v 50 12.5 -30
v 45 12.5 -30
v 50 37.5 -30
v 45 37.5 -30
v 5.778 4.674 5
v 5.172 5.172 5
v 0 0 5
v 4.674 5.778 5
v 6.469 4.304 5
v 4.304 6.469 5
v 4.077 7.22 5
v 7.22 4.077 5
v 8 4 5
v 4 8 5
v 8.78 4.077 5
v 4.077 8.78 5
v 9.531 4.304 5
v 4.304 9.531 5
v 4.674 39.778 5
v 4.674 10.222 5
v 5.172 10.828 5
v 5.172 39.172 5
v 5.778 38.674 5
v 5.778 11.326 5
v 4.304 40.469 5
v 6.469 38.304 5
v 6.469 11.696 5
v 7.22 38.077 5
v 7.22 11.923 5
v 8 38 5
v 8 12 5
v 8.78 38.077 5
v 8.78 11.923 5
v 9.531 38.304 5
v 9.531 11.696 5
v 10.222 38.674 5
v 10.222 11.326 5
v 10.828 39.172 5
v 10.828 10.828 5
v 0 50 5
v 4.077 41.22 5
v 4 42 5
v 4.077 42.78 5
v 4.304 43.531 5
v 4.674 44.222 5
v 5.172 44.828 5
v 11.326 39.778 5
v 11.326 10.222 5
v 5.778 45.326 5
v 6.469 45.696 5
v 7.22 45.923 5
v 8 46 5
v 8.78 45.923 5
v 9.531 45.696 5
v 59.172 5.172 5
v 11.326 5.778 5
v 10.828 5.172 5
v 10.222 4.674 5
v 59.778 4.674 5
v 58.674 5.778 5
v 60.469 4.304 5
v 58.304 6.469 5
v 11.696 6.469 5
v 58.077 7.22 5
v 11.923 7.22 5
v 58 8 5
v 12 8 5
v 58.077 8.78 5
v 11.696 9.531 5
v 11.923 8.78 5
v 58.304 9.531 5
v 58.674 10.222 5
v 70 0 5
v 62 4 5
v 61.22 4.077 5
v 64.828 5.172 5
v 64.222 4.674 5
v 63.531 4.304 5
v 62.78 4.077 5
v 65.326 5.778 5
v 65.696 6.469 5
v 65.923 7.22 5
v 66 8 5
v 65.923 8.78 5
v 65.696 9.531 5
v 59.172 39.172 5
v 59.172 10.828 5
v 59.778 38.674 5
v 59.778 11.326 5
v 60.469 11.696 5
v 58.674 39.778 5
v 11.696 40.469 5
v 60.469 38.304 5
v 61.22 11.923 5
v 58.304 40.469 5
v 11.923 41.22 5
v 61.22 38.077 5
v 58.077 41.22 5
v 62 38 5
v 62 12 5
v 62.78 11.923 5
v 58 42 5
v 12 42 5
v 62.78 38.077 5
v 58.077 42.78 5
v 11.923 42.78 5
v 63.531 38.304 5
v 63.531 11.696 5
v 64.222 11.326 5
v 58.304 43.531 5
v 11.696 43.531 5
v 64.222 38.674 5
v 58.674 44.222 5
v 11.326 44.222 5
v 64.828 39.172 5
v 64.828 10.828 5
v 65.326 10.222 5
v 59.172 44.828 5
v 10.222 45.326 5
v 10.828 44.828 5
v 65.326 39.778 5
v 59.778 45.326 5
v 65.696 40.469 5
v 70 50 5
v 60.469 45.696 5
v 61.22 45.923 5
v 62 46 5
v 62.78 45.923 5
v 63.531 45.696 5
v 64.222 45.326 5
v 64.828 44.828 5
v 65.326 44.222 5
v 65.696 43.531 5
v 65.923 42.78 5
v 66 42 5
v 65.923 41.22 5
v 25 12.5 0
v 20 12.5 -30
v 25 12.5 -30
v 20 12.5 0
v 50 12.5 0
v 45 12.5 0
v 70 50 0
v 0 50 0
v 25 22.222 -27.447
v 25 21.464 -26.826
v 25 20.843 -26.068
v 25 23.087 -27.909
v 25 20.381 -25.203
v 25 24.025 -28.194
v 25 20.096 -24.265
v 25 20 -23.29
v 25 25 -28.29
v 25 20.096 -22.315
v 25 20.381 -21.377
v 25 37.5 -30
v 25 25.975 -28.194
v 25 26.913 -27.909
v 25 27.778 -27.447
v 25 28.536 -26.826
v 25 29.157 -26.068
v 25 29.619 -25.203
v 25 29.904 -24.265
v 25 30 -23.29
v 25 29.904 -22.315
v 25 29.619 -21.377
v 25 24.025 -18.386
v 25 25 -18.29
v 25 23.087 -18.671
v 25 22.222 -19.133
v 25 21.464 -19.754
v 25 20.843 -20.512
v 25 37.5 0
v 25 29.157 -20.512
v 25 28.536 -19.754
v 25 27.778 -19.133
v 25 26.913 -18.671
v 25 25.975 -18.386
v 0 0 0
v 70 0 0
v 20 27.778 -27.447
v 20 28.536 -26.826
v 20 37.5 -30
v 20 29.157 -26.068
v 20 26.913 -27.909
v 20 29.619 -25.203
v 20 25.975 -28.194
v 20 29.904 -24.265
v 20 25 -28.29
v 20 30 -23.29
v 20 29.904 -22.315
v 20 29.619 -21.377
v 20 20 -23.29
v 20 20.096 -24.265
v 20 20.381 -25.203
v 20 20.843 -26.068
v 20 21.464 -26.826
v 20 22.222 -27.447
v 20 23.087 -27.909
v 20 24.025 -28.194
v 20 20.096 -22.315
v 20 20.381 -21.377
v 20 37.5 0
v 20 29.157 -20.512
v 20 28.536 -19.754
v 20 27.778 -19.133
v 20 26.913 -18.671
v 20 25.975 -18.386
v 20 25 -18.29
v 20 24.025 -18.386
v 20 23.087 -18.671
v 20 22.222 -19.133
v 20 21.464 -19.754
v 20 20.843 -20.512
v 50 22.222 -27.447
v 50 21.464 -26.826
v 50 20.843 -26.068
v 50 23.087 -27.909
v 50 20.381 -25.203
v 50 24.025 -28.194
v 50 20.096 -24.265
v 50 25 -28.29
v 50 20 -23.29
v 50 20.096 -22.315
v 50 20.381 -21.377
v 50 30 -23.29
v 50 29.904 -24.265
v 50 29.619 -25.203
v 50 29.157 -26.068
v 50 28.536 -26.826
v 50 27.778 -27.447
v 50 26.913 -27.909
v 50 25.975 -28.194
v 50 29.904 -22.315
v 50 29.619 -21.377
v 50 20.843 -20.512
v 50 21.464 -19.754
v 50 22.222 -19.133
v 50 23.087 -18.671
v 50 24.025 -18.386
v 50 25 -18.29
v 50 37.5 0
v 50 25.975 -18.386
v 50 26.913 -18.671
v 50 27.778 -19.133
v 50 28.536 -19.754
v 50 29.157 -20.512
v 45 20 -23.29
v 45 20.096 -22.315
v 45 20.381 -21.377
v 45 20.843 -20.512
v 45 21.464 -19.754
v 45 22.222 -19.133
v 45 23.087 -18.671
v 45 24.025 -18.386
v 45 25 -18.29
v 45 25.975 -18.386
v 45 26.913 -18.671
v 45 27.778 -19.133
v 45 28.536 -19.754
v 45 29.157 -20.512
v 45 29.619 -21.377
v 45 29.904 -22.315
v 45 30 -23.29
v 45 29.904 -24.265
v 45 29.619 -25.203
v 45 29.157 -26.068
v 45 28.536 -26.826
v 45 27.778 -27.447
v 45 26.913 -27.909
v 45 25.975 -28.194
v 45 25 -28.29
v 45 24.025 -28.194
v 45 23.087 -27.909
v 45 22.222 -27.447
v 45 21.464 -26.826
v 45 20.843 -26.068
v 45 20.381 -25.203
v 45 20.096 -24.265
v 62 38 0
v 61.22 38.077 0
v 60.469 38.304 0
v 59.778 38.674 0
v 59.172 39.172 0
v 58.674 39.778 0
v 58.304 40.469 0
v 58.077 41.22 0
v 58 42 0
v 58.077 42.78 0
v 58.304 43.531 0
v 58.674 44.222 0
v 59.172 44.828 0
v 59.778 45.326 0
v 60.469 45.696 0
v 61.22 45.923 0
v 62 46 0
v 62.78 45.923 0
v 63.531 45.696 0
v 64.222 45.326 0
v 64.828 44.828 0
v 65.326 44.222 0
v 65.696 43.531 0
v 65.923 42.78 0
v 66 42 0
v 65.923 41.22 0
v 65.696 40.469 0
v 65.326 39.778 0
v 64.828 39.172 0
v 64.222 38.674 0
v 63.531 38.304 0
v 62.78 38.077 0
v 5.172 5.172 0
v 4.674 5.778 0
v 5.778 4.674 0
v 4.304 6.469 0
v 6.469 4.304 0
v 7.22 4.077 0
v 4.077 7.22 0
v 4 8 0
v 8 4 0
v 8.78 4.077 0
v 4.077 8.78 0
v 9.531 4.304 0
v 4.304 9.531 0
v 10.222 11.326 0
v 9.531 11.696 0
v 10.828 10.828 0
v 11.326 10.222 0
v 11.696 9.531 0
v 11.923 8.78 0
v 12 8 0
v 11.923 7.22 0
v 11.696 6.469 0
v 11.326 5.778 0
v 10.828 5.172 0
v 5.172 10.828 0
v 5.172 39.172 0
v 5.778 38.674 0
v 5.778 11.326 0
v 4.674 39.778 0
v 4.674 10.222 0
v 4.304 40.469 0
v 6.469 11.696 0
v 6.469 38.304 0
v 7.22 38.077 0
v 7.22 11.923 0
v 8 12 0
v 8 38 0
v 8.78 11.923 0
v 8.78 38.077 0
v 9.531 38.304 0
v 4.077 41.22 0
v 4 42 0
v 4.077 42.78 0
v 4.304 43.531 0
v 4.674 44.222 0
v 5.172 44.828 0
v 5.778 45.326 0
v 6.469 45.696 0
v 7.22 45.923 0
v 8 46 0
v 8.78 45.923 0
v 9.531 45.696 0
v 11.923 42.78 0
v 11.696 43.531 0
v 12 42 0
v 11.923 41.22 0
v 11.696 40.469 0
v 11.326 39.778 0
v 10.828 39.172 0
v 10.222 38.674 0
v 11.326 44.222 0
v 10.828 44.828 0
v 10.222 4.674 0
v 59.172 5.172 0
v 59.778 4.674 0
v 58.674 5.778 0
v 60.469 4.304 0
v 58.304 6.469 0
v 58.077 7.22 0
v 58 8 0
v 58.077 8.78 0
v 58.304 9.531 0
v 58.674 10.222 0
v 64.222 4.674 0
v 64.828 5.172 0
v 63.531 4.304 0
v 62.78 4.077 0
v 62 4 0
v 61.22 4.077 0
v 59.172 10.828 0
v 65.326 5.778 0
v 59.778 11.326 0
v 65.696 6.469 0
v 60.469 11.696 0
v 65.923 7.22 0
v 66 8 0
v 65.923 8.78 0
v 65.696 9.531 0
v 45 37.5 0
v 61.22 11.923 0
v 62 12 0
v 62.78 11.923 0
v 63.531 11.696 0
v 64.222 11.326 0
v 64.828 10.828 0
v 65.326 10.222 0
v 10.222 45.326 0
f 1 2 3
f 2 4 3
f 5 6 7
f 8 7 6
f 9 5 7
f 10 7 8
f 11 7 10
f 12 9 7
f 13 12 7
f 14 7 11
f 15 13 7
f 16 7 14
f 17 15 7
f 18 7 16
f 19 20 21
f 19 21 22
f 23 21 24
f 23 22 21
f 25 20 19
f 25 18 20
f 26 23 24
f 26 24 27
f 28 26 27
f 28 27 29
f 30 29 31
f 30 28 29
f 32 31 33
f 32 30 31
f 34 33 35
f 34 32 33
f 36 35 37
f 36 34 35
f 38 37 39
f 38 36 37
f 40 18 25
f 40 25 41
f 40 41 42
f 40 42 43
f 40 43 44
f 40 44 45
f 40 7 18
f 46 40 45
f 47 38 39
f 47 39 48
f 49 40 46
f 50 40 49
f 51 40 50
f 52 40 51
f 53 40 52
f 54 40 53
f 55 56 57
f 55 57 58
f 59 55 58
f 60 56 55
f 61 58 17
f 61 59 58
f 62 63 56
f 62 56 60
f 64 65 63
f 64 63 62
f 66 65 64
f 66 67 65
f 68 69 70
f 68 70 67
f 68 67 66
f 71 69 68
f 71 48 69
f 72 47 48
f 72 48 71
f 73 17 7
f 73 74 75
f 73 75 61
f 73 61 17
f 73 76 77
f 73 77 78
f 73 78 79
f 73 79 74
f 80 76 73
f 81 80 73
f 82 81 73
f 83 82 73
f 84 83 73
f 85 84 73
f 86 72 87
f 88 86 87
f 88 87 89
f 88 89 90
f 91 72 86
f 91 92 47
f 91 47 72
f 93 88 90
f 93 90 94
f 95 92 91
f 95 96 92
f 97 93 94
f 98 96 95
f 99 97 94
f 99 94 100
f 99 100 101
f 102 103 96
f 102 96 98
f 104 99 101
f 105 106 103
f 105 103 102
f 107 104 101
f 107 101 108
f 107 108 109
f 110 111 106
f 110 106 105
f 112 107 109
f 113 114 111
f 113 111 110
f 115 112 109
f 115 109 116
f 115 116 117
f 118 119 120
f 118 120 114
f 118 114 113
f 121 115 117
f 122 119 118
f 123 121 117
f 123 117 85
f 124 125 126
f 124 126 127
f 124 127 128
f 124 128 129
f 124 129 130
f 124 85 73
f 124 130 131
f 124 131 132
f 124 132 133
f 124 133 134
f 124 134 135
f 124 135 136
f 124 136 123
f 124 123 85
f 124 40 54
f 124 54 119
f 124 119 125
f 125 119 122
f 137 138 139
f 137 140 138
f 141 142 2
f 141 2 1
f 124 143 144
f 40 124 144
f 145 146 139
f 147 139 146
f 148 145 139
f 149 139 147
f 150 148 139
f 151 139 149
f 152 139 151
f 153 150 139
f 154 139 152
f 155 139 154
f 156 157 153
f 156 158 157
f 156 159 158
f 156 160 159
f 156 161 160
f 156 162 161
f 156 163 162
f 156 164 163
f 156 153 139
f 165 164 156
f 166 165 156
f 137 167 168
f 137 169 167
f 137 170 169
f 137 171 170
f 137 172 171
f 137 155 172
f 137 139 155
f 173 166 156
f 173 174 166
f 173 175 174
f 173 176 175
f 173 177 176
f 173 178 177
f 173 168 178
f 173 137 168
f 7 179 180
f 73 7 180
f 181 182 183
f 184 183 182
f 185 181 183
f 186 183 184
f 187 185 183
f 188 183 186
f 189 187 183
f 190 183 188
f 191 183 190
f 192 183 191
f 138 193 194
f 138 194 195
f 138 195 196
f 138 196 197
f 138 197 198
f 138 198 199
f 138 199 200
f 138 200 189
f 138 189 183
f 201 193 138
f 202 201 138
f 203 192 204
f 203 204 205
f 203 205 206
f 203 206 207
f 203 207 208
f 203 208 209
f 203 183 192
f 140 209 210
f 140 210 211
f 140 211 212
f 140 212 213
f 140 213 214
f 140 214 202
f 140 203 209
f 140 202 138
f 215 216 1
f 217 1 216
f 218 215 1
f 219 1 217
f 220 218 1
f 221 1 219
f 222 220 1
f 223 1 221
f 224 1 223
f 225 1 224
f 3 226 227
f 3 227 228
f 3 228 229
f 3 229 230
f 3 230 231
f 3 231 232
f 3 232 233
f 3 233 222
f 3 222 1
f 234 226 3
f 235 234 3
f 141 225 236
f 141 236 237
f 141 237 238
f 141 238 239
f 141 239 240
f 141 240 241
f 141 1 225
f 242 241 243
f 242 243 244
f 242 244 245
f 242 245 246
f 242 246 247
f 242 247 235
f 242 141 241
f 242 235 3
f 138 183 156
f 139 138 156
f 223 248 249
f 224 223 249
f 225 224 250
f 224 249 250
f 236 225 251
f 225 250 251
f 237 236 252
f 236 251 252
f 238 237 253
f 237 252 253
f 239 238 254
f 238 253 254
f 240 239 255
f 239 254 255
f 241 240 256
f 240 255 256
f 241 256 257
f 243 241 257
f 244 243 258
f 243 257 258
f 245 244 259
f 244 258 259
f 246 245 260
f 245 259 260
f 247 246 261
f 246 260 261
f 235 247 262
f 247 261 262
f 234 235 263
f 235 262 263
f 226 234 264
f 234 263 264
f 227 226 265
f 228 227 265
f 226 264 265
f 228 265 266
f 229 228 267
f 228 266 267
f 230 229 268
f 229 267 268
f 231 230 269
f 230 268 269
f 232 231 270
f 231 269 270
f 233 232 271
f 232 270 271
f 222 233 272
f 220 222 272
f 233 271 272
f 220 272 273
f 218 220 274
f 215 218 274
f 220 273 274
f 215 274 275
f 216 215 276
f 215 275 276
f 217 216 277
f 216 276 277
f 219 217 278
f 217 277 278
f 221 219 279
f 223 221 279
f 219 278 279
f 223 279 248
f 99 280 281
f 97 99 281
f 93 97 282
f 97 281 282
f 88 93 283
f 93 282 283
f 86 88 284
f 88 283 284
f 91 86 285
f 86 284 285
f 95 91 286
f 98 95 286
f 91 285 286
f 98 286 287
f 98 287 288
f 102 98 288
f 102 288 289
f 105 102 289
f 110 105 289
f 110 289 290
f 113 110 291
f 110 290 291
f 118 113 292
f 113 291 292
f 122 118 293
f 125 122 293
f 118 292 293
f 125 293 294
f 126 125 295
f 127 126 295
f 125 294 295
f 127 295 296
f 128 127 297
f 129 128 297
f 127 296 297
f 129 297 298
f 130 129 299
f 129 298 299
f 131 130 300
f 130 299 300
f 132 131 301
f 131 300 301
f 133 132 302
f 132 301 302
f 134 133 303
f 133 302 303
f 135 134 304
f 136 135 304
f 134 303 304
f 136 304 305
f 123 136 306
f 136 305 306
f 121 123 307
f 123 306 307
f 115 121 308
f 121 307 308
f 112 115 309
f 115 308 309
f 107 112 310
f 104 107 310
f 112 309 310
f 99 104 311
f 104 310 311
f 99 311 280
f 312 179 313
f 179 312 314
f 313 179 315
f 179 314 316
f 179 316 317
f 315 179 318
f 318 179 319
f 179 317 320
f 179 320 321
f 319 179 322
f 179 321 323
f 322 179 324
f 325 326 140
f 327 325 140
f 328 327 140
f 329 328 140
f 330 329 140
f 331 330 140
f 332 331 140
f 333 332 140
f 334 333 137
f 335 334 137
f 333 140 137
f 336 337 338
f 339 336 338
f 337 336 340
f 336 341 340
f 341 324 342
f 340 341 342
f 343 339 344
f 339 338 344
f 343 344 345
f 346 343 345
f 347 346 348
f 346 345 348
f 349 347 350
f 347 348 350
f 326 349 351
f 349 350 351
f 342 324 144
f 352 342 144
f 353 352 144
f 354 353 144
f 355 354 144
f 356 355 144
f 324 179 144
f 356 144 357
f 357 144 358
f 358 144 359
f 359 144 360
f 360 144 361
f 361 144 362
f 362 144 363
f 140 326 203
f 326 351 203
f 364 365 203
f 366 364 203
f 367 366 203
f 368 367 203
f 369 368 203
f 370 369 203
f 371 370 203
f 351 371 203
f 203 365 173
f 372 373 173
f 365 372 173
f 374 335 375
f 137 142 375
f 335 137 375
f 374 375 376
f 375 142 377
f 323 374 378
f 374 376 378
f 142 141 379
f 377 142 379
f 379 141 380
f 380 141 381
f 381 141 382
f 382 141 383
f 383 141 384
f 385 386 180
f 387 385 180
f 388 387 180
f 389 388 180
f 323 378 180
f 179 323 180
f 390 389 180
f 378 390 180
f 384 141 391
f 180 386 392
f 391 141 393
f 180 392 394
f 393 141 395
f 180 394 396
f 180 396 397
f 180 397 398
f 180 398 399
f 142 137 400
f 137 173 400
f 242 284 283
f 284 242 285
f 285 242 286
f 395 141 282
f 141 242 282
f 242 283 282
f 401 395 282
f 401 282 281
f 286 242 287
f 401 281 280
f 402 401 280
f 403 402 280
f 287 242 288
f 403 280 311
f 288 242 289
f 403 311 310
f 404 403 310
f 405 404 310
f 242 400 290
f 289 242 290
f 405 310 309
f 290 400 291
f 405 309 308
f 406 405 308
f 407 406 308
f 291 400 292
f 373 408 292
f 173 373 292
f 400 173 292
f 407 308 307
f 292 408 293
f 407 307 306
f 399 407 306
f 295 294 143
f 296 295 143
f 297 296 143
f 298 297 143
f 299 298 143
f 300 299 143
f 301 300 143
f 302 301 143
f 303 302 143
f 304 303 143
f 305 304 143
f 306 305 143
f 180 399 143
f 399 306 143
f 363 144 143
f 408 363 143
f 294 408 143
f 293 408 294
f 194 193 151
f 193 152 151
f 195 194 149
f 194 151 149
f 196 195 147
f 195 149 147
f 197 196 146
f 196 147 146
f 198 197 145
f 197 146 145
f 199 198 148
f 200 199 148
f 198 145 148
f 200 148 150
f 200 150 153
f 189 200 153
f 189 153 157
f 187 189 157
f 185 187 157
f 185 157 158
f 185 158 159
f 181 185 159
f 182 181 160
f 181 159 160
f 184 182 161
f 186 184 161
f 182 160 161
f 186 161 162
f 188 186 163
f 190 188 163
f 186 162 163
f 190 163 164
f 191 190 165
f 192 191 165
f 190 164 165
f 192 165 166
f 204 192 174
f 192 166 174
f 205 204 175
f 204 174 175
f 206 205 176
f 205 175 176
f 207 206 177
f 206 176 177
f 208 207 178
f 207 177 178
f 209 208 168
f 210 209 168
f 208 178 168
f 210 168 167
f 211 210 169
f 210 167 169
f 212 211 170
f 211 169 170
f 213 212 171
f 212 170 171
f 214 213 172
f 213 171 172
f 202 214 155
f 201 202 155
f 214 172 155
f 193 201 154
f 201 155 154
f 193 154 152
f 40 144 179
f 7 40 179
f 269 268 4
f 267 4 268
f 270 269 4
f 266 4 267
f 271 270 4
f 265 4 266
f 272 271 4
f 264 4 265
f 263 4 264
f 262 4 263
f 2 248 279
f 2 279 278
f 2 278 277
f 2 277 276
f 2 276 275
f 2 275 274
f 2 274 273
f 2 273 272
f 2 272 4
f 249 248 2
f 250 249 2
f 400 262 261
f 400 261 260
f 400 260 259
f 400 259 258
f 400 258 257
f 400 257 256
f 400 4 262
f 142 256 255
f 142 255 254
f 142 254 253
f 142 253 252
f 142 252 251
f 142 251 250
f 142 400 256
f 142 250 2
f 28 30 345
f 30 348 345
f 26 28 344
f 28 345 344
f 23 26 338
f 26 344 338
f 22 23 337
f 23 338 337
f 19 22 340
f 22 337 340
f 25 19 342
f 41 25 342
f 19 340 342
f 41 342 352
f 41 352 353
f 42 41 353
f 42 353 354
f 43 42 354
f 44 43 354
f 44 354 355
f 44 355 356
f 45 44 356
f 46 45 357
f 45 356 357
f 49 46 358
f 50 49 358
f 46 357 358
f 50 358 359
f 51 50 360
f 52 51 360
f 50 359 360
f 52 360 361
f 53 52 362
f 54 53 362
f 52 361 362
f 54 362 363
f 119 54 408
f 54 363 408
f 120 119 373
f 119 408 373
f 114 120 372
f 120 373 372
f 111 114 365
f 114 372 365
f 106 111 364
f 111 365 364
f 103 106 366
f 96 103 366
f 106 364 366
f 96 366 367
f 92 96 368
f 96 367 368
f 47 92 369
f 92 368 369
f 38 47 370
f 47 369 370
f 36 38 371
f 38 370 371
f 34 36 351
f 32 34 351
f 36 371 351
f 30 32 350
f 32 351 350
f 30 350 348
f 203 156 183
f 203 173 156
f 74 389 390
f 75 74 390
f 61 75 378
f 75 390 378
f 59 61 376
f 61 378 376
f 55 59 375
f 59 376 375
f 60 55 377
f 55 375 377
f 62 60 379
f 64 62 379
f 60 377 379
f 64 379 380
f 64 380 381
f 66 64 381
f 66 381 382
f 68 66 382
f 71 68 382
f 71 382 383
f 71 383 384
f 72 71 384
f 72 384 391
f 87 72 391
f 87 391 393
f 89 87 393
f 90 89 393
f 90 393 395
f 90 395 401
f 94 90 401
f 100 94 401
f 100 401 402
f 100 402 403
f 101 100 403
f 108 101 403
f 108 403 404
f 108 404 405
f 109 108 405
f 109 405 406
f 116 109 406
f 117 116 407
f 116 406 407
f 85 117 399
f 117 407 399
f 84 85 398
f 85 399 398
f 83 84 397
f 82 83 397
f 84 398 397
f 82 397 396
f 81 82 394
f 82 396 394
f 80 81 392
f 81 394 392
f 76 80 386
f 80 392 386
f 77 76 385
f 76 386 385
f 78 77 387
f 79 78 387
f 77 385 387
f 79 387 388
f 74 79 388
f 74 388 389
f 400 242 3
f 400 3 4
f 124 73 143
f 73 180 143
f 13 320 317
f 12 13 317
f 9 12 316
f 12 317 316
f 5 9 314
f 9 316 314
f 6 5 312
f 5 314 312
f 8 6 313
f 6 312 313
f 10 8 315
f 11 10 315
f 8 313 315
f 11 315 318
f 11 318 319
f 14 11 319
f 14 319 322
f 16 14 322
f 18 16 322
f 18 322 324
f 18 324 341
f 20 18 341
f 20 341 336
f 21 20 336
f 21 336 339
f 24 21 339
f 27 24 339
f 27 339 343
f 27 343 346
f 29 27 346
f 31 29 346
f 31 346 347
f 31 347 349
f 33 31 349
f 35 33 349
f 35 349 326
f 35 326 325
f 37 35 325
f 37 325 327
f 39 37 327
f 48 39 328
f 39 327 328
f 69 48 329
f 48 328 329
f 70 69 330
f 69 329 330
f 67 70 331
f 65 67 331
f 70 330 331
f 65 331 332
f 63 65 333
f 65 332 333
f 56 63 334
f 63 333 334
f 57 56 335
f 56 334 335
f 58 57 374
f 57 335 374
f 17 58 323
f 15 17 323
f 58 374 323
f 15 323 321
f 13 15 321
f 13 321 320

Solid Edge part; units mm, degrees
sketch "Sketch1" plane through (0, 0, 0) normal (0, 0, 1) x (1, 0, 0)
  line L0 (0, 0) -> (70, 0)
  line L1 (70, 0) -> (70, 50)
  line L2 (70, 50) -> (0, 50)
  line L3 (0, 50) -> (0, 0)
extrude "Protrusion1" add sketch "Sketch1" along normal blind 5
sketch "Sketch2" plane through (0, 0, 0) normal (0, 0, 1) x (1, 0, 0)
  line L0 (25, 12.5) -> (25, 37.5)
  line L1 (25, 37.5) -> (20, 37.5)
  line L2 (20, 37.5) -> (20, 12.5)
  line L3 (20, 12.5) -> (25, 12.5)
extrude "ExtrudedProtrusion_2" add sketch "Sketch2" against normal blind 30
sketch "Sketch3" plane through (25, 25, -6.7078) normal (1, 0, 0) x (0, -1, 0)
  circle A0 centre (0, 16.5822) radius 5
extrude "ExtrudedCutout_1" cut sketch "Sketch3" against normal blind 57.348
sketch "Sketch4" plane through (35, 25, 0) normal (0, 0, -1) x (0, -1, 0)
  circle A0 centre (17, -27) radius 4
  circle A1 centre (-17, -27) radius 4
  circle A2 centre (-17, 27) radius 4
  circle A3 centre (17, 27) radius 4
  dimension "D1" = 8
  dimension "D2" = 8
  dimension "D3" = 8
  dimension "D4" = 8
  dimension "D5" = 8
extrude "ExtrudedCutout_2" cut sketch "Sketch4" against normal blind 22.6316
mirror "Mirror1" about plane through (35, 25, -6.7078) normal (1, 0, 0) of "ExtrudedProtrusion_2", "ExtrudedCutout_1"
properties material "Stainless steel"
